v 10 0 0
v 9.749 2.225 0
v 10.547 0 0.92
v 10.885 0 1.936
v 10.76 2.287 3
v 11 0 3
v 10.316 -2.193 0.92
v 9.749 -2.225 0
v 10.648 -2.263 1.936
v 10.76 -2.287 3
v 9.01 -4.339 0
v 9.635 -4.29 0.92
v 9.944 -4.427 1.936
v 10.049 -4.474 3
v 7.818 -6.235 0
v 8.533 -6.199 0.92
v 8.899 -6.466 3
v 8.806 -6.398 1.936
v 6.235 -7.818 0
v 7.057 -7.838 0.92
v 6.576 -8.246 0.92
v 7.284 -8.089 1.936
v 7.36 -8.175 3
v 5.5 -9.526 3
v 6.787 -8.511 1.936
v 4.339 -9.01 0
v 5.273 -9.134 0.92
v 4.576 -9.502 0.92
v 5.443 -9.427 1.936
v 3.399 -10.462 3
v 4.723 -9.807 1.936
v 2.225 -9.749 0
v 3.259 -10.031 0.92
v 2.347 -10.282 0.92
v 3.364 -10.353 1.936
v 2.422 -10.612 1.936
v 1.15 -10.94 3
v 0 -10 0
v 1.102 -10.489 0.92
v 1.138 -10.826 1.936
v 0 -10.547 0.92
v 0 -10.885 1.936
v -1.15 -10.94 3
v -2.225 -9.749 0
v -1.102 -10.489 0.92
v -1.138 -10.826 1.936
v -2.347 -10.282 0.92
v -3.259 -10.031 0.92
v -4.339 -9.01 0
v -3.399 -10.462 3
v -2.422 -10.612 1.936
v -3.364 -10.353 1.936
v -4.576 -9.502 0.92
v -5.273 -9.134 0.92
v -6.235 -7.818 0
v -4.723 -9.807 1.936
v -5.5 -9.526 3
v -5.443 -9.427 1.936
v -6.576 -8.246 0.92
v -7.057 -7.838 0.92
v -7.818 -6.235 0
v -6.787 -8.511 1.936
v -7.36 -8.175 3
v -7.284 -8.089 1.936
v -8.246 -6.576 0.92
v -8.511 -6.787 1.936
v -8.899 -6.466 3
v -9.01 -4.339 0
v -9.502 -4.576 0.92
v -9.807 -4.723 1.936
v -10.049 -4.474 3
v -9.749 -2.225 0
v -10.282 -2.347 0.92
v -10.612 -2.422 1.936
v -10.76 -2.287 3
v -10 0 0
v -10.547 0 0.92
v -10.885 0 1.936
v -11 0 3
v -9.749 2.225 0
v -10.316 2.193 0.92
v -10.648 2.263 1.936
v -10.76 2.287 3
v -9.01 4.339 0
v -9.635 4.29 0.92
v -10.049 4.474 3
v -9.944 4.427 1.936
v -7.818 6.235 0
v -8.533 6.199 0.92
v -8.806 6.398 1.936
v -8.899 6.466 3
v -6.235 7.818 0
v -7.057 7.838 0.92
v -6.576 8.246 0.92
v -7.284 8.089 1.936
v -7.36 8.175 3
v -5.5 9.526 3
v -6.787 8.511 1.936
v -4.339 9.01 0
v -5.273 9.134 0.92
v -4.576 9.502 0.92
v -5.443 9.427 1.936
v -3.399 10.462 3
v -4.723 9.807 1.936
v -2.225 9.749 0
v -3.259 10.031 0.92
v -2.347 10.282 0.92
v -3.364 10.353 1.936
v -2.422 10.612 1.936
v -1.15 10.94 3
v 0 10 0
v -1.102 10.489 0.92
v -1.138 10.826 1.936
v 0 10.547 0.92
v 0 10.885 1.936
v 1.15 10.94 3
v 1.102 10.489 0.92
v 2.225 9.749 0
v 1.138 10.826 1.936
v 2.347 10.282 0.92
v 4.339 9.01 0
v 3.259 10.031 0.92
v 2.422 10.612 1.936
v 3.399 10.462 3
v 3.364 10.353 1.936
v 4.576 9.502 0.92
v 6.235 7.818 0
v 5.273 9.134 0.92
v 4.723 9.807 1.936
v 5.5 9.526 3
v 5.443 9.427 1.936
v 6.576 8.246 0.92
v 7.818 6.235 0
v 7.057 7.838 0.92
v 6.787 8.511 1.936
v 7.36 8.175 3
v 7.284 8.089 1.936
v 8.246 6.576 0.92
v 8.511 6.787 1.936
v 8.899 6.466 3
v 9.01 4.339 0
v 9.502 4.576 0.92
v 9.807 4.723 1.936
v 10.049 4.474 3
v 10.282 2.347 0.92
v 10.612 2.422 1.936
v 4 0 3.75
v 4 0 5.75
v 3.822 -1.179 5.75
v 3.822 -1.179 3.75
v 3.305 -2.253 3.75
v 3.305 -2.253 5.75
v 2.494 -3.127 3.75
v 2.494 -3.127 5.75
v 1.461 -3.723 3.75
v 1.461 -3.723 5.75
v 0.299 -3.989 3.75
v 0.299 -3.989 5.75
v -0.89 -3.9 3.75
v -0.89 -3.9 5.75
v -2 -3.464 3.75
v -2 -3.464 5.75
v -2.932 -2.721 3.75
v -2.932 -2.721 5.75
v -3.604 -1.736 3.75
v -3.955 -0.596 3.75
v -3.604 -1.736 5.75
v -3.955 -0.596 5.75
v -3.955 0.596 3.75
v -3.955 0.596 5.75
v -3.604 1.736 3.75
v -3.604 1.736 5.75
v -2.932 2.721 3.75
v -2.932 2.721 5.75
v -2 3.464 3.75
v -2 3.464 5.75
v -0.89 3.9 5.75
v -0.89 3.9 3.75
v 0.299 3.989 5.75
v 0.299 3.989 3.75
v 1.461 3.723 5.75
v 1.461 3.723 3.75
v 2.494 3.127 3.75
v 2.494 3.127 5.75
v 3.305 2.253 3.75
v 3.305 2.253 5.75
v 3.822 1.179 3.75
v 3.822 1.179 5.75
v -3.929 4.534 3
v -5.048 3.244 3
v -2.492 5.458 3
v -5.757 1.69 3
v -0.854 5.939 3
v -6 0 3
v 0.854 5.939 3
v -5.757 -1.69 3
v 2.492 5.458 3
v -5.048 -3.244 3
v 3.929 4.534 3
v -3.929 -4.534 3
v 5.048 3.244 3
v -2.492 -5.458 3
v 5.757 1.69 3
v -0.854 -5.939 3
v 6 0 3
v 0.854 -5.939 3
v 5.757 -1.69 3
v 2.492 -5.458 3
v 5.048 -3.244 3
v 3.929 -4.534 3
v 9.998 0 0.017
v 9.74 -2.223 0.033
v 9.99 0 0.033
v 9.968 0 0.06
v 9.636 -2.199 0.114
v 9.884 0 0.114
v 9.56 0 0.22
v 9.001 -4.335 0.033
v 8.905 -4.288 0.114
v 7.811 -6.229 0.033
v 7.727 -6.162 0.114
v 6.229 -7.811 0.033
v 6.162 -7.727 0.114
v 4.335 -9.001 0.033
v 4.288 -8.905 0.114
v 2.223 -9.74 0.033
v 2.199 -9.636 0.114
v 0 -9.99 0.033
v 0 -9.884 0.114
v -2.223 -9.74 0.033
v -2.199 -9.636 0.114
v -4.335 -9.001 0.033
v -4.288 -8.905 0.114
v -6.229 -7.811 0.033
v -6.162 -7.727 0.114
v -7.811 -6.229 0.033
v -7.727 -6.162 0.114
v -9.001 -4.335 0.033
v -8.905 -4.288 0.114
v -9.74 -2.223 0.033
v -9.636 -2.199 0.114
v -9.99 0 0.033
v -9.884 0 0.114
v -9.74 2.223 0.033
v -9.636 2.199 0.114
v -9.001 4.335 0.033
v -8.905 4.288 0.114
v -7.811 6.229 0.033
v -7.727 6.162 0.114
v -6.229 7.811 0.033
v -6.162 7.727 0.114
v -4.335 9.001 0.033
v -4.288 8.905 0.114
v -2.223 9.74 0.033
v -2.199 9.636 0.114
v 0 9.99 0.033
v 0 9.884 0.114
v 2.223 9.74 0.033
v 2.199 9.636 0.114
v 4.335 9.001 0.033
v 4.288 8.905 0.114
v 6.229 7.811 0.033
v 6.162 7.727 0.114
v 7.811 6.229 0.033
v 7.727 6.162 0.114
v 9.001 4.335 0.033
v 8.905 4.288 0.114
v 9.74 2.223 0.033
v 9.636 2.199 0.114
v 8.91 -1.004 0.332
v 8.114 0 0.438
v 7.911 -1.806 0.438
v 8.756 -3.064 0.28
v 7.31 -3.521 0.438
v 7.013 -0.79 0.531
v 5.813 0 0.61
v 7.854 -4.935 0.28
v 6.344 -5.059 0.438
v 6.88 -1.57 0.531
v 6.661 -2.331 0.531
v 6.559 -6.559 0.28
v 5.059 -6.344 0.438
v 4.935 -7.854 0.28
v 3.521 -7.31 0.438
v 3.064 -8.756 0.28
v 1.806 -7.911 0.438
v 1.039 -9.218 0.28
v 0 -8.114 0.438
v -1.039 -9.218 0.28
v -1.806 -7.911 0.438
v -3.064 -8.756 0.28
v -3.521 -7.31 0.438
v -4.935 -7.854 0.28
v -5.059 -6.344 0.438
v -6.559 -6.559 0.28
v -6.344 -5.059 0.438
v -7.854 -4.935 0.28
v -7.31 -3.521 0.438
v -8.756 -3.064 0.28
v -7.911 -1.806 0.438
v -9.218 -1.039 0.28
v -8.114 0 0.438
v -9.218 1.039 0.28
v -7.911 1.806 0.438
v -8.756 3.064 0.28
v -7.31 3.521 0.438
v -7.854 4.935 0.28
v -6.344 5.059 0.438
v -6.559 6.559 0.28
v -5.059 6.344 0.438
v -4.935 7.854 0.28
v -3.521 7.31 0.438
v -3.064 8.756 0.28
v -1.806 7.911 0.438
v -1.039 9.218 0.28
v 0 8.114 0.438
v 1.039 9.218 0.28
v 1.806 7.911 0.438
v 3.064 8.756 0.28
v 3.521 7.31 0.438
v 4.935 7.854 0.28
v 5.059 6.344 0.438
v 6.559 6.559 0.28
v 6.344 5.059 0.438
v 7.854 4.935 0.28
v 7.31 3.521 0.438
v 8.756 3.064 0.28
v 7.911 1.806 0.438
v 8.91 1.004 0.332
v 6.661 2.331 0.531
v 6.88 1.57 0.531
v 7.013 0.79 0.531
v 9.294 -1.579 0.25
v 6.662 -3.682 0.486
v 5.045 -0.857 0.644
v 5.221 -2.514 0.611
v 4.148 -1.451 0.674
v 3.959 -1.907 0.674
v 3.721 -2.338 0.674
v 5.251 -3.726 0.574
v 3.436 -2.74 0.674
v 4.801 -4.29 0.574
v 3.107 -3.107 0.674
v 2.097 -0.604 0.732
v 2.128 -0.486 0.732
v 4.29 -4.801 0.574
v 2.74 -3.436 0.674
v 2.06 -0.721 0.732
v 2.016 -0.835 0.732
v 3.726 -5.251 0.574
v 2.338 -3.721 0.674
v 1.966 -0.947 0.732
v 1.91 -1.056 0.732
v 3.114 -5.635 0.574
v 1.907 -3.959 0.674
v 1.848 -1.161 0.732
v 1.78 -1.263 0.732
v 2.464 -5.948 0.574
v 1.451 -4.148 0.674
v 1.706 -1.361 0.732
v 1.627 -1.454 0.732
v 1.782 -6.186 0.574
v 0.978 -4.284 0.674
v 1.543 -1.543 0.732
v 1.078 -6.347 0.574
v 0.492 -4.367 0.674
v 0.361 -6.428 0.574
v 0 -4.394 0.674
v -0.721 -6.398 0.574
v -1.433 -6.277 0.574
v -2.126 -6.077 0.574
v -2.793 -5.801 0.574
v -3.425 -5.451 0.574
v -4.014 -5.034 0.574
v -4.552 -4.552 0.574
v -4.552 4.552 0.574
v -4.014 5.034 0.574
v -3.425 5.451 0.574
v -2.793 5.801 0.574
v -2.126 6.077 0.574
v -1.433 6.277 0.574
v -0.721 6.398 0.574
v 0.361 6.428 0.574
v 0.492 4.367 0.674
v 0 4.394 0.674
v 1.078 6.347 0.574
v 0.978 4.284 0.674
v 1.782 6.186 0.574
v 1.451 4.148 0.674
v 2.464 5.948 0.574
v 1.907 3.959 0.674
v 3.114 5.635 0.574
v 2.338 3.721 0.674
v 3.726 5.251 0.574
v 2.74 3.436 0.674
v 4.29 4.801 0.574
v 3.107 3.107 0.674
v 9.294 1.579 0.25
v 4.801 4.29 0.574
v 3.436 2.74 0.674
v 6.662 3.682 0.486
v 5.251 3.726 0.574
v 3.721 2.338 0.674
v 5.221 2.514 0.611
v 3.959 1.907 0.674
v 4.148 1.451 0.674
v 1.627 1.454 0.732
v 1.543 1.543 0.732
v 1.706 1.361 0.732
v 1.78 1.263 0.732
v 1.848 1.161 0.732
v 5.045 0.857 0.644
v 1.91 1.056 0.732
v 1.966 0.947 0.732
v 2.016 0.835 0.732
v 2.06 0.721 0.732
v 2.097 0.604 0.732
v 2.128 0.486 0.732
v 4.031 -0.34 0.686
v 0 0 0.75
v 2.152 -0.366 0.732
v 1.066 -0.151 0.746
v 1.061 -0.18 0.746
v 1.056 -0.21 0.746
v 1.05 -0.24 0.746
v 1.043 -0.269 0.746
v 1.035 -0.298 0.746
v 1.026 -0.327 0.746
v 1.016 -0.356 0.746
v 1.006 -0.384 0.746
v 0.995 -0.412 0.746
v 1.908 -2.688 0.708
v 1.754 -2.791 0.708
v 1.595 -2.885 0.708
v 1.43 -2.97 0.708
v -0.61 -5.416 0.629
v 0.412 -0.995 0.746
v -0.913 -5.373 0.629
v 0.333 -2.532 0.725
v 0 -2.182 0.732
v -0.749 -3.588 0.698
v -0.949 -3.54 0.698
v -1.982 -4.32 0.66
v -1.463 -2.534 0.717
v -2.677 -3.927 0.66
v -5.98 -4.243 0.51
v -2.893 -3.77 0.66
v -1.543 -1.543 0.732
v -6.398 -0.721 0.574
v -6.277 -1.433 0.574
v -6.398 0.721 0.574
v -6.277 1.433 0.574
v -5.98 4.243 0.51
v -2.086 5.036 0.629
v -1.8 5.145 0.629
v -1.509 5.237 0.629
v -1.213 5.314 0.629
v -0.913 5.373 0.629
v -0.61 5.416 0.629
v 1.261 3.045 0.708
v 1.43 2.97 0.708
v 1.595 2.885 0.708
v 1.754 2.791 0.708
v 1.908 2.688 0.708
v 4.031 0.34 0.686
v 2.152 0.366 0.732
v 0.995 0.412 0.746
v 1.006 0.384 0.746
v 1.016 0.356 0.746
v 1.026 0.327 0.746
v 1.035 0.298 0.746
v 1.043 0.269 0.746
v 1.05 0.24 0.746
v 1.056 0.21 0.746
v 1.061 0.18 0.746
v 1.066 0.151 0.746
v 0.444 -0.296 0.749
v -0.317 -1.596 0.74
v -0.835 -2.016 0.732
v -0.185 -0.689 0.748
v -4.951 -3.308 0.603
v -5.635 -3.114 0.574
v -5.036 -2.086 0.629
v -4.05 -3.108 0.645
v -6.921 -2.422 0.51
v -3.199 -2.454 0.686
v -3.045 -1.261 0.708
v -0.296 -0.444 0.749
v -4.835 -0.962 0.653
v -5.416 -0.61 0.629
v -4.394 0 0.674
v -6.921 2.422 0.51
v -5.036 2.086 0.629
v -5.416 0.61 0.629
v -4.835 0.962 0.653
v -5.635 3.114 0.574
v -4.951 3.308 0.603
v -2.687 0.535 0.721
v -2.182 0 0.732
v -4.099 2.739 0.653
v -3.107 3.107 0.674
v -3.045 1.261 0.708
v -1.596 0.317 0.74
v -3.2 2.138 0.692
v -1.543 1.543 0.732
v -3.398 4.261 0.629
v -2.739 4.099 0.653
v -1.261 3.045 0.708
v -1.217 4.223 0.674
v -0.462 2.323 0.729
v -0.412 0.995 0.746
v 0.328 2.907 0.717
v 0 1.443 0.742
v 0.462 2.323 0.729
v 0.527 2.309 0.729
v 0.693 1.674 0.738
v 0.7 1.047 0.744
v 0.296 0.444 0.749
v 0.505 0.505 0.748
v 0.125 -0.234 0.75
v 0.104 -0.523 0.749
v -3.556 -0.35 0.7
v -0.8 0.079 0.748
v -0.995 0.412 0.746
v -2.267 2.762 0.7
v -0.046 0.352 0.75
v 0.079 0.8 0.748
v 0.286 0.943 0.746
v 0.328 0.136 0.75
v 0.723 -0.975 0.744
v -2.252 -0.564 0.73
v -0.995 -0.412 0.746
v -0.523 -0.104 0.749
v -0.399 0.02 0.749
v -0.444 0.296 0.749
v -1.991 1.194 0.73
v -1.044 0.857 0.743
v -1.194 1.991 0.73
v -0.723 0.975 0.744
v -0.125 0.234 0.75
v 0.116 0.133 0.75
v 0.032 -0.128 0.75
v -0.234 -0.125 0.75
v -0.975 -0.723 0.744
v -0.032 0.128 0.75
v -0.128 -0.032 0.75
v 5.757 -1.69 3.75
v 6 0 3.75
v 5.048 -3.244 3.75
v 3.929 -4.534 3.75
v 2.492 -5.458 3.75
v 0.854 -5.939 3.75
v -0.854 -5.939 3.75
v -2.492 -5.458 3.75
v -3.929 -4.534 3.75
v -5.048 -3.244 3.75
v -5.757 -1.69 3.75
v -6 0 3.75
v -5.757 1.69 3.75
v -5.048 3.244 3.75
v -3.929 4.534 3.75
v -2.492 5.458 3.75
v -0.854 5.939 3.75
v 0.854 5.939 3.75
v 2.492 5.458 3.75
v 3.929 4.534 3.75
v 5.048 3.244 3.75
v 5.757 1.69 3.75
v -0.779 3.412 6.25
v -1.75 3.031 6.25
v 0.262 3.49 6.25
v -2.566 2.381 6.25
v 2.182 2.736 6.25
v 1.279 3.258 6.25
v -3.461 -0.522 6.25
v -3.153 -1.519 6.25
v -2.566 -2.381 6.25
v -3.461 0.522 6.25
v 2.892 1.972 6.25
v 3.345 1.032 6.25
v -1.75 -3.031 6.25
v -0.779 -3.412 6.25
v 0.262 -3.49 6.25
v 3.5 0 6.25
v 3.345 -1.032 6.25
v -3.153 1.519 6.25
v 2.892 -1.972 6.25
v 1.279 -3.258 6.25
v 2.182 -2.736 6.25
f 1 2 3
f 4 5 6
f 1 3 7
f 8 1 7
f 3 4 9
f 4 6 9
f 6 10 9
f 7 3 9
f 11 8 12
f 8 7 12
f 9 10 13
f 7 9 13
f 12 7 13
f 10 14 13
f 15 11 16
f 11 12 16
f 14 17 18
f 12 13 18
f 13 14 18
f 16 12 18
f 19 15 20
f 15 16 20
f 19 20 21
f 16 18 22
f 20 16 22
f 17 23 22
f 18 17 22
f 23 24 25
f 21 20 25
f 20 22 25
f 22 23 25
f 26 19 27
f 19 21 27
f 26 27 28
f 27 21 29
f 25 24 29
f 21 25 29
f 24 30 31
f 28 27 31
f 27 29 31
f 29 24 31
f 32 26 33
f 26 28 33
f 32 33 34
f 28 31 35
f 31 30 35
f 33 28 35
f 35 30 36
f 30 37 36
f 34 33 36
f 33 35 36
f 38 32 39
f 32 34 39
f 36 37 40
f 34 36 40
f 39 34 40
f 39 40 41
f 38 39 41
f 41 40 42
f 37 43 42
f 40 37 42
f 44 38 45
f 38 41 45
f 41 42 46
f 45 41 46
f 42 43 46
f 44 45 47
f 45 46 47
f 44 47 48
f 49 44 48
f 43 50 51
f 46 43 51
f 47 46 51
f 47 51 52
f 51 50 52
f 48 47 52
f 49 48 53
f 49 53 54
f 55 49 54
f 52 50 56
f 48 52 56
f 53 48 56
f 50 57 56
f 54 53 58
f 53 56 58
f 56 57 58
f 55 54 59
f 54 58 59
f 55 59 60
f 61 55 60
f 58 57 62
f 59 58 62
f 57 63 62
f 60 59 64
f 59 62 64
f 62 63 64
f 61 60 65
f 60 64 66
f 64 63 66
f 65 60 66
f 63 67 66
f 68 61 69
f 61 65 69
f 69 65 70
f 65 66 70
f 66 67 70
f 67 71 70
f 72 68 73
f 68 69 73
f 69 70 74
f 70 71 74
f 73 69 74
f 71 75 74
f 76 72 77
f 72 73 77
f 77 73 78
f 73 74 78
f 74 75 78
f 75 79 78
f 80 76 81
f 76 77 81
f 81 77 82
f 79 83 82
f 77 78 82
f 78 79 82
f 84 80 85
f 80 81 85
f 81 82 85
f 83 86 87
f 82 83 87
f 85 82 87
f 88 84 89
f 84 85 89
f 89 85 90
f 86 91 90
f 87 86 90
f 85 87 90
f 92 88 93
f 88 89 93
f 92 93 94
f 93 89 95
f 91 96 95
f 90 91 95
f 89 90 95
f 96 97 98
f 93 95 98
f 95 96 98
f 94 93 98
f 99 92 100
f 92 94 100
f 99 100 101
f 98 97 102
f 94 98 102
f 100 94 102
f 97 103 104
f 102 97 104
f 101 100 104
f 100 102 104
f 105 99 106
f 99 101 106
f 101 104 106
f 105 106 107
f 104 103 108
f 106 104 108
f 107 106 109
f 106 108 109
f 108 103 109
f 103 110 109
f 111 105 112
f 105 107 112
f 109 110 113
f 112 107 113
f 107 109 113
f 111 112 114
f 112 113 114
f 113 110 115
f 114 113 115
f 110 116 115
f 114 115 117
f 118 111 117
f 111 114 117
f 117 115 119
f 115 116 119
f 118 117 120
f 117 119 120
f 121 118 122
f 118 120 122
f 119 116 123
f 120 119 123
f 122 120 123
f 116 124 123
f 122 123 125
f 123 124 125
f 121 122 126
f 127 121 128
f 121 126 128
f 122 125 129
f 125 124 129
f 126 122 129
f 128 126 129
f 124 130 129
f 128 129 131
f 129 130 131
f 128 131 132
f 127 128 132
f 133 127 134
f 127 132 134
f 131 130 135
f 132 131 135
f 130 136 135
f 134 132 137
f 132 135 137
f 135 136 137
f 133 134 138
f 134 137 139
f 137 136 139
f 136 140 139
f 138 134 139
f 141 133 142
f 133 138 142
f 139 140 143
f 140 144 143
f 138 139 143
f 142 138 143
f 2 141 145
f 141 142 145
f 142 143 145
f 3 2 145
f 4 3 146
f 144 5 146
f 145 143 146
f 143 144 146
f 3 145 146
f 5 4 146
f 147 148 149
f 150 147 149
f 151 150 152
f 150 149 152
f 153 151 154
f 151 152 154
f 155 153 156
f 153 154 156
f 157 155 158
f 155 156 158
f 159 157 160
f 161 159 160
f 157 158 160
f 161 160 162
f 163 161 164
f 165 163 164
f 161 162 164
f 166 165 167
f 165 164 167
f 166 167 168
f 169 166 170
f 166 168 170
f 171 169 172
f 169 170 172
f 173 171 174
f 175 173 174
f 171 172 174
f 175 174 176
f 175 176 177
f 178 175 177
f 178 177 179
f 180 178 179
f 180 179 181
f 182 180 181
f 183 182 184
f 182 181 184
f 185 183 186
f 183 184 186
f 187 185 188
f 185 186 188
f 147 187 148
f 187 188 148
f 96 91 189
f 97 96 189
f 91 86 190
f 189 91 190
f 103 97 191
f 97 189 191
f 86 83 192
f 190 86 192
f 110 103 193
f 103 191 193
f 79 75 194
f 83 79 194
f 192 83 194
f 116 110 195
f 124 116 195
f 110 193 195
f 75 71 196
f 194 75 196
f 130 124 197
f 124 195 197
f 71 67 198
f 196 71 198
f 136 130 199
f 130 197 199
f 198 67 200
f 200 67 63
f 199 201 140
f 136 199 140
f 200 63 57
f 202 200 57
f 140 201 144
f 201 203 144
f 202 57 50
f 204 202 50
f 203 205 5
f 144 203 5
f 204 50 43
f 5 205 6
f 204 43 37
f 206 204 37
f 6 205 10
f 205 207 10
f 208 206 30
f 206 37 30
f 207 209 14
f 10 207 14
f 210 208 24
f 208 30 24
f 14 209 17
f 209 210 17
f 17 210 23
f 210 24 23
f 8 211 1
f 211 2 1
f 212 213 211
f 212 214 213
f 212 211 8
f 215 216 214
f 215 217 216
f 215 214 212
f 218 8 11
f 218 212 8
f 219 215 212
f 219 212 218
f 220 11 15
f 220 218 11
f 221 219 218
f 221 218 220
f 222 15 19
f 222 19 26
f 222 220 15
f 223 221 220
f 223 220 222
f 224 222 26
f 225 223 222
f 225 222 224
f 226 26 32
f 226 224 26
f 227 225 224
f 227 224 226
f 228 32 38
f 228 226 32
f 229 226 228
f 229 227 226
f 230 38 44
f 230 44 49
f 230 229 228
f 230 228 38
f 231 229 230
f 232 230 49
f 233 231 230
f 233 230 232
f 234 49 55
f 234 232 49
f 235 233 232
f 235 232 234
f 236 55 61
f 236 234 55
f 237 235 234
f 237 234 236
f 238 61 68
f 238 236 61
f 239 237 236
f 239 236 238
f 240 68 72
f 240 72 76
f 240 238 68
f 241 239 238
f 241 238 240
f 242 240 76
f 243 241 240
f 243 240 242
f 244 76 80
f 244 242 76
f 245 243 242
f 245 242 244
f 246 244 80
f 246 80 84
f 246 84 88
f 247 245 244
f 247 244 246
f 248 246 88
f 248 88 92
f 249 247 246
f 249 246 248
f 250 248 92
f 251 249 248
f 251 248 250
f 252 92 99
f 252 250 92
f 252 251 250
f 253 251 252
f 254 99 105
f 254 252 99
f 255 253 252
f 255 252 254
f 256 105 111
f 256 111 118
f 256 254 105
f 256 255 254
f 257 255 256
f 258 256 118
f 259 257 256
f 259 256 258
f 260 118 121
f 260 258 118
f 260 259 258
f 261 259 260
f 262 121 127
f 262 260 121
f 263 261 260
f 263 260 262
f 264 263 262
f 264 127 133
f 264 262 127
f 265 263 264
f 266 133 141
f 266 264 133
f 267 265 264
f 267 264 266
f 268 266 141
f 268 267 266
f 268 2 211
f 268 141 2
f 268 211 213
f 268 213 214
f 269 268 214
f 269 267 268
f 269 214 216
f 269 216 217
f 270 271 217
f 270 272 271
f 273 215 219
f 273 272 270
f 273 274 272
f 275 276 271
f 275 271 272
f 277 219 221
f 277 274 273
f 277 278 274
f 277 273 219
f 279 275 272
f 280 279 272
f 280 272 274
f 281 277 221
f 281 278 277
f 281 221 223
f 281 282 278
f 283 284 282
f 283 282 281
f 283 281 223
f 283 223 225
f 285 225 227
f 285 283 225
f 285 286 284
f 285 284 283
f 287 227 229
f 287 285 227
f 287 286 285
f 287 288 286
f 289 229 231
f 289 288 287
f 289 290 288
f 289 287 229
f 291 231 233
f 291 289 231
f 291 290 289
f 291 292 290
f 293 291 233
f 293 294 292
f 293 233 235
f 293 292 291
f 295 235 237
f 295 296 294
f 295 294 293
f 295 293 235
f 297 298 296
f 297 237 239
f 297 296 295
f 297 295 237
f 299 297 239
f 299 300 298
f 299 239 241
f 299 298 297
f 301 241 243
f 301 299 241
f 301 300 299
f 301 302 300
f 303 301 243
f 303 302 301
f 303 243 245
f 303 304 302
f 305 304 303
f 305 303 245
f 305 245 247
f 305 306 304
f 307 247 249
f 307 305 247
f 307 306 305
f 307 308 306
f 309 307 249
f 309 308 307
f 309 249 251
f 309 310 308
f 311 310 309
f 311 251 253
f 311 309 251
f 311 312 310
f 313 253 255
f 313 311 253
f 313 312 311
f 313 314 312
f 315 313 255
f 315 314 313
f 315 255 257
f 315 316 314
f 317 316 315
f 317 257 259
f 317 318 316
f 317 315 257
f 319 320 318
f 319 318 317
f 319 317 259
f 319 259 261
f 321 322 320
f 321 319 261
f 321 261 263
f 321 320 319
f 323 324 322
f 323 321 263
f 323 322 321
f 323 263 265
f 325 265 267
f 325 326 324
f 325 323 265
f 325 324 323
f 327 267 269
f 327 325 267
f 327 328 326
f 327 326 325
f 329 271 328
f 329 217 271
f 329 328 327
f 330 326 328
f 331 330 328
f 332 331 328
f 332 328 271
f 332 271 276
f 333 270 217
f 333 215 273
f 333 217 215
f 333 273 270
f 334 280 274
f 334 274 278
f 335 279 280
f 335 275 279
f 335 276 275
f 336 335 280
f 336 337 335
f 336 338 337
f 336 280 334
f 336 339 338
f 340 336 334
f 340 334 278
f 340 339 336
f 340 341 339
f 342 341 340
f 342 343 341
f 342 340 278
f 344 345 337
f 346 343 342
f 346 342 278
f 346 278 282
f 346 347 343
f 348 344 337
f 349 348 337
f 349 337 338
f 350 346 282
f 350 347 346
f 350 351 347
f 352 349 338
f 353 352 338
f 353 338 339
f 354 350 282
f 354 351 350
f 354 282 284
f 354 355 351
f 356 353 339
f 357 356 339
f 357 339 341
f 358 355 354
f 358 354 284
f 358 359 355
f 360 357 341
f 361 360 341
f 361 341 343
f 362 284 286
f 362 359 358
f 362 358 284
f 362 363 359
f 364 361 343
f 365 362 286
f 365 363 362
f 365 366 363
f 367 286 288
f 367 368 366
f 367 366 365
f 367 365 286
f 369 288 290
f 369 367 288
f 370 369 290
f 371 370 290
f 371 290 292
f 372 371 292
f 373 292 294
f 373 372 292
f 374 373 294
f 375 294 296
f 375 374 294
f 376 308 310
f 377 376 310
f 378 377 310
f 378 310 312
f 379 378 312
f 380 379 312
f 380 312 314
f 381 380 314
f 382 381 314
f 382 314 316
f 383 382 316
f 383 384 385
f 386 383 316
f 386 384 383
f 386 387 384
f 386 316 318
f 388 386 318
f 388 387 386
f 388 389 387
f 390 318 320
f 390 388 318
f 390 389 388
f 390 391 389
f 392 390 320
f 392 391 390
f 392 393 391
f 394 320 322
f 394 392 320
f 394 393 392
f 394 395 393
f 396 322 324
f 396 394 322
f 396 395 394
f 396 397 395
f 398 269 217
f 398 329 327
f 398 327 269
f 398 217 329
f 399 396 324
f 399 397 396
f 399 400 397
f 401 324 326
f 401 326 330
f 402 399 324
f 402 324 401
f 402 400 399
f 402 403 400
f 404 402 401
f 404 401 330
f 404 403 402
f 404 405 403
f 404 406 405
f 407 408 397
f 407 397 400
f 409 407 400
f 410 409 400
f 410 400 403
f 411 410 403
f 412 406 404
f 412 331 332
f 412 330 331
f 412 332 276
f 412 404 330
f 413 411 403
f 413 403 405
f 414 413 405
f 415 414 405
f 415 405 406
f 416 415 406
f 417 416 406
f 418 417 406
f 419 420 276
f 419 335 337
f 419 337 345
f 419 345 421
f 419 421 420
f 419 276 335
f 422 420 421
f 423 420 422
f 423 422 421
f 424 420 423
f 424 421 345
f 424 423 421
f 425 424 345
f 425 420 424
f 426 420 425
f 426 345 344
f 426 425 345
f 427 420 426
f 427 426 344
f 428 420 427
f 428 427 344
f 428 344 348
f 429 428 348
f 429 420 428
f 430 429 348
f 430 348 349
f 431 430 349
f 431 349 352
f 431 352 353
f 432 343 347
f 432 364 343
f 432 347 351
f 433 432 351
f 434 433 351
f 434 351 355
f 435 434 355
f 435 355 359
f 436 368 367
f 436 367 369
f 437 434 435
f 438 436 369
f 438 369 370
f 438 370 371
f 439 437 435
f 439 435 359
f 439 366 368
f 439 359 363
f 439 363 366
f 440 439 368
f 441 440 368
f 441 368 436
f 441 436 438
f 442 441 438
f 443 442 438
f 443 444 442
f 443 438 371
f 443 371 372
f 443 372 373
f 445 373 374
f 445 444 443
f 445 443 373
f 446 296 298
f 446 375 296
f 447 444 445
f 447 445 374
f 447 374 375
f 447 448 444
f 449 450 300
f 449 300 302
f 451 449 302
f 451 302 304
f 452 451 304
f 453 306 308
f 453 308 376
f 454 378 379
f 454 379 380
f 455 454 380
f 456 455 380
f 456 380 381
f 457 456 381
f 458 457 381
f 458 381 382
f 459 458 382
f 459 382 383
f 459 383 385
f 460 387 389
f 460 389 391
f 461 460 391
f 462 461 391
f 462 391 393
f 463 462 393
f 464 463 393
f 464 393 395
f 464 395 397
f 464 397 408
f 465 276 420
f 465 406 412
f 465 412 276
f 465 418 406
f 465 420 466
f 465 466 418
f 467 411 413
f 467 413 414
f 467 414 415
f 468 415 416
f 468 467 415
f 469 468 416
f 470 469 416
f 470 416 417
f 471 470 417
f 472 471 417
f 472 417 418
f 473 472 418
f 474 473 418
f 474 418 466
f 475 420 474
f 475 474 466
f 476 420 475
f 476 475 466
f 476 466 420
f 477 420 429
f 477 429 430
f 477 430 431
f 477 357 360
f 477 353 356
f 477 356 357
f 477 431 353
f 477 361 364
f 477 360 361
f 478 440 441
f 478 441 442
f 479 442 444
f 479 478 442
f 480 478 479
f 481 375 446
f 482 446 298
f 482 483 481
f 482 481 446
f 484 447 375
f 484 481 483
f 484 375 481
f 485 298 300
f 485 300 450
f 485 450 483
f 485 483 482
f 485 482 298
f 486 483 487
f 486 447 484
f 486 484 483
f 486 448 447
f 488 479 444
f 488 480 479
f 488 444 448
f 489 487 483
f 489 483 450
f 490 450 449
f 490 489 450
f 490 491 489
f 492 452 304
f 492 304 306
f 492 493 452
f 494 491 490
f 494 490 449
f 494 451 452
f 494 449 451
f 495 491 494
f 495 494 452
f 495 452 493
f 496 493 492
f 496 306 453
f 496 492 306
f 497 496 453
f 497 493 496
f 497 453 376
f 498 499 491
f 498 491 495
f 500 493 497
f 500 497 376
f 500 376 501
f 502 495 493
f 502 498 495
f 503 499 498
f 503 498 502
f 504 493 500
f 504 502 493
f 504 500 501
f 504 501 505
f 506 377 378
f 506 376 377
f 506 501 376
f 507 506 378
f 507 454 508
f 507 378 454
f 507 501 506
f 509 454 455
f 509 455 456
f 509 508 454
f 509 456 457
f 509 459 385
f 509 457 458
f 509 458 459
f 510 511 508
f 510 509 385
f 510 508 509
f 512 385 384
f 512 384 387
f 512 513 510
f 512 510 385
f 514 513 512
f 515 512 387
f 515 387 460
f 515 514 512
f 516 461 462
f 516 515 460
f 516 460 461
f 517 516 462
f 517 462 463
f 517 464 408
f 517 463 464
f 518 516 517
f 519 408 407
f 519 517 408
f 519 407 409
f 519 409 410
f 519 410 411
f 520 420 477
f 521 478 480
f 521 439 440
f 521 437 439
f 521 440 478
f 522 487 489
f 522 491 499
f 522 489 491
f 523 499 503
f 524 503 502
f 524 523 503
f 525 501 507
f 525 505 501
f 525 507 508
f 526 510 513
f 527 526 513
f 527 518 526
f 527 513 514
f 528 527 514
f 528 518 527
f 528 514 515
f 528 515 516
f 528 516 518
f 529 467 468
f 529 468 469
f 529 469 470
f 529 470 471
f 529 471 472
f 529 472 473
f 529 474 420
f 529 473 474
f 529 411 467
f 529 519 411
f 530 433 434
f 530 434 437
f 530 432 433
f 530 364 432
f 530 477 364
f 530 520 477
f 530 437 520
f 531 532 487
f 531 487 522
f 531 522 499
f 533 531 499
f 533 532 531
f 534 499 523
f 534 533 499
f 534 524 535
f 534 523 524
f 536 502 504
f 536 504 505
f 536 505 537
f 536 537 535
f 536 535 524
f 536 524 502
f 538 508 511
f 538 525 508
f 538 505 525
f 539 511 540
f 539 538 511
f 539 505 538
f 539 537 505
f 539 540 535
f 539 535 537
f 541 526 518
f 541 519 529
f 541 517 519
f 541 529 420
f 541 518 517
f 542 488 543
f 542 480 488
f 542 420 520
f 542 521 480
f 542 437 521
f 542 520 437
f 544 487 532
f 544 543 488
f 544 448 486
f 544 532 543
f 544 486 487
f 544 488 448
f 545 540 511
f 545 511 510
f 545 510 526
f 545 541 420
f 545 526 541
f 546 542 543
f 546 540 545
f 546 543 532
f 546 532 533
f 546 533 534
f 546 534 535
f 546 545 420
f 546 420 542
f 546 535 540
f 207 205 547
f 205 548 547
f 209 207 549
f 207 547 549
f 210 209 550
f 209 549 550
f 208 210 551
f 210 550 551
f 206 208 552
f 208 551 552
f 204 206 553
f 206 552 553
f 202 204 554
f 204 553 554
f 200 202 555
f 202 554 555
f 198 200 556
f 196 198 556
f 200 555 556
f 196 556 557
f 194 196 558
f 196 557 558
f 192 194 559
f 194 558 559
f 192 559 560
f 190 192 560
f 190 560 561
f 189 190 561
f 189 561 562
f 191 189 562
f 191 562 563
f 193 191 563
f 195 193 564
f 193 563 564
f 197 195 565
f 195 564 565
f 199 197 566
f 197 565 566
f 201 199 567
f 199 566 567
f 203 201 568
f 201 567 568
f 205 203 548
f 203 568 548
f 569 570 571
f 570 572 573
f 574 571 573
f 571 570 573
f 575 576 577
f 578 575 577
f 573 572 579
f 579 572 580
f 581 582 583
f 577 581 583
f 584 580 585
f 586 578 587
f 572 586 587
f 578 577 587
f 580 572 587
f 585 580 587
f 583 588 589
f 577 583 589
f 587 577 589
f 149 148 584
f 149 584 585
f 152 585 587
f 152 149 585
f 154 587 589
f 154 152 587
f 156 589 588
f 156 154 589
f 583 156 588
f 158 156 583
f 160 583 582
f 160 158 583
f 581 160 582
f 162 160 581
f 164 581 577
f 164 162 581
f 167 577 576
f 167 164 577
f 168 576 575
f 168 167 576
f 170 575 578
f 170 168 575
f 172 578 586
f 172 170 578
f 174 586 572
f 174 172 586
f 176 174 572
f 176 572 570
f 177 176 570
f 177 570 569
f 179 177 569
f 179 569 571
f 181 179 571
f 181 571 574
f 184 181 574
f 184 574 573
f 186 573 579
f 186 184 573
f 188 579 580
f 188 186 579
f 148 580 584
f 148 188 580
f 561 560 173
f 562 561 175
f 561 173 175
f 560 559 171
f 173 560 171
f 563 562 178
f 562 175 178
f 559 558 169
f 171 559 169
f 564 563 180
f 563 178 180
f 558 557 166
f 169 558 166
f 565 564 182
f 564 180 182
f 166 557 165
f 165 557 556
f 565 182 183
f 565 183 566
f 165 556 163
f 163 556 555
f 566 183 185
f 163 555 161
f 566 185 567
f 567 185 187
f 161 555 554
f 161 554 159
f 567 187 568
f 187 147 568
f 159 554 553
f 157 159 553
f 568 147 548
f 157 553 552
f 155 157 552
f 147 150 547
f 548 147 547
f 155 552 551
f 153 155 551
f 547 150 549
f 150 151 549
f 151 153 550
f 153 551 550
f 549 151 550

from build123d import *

# Parameters (mm, degrees)
F3_SIZE = 0.5


# Not quite as in the source:
# - a fillet or chamfer that OpenCascade refuses, or shapes differently, is made with other operations: its cross-section is extruded or revolved along the edge and cut away or added


with BuildPart() as f1:
    # F0 (on Front) → F1 (revolve)
    with BuildSketch(Plane.XZ):
        with BuildLine():
            Line((4, 6.25), (0, 6.25))
            Line((0, 6.25), (0, 0.75))
            add(Edge.make_bspline(
                [(10, 0), (10, 0.75), (0, 0.75)],
                knots=[0, 0, 0, 1.5707963268, 1.5707963268, 1.5707963268], degree=2, weights=[1, 0.7071067812, 1]))
            Line((10, 0), (11, 0))
            Line((11, 0), (11, 3))
            Line((11, 3), (6, 3))
            Line((6, 3), (6, 3.75))
            Line((6, 3.75), (4, 3.75))
            Line((4, 3.75), (4, 6.25))
        make_face()
    revolve(axis=Axis((0, 0, 3.5), (0, 0, -1)))

    # F2: fillet of radius 5 on 1 edges, made by hand

    # F2_s1 → F2_t2 (revolve, cut)
    with BuildSketch(Plane.XZ):
        with BuildLine():
            ThreePointArc((10, 0), (10.7434164903, 1.4188611699), (11, 3))
            Line((11, 3), (11, 0))
            Line((11, 0), (10, 0))
        make_face()
    revolve(axis=Axis((0, 0, 0), (0, 0, -1)), mode=Mode.SUBTRACT)

    # F3
    f3_edges = [f1.edges().sort_by_distance(p)[0] for p in [
        (-4, 0, 6.25),
    ]]
    chamfer(f3_edges, length=F3_SIZE)


solid = f1.part
